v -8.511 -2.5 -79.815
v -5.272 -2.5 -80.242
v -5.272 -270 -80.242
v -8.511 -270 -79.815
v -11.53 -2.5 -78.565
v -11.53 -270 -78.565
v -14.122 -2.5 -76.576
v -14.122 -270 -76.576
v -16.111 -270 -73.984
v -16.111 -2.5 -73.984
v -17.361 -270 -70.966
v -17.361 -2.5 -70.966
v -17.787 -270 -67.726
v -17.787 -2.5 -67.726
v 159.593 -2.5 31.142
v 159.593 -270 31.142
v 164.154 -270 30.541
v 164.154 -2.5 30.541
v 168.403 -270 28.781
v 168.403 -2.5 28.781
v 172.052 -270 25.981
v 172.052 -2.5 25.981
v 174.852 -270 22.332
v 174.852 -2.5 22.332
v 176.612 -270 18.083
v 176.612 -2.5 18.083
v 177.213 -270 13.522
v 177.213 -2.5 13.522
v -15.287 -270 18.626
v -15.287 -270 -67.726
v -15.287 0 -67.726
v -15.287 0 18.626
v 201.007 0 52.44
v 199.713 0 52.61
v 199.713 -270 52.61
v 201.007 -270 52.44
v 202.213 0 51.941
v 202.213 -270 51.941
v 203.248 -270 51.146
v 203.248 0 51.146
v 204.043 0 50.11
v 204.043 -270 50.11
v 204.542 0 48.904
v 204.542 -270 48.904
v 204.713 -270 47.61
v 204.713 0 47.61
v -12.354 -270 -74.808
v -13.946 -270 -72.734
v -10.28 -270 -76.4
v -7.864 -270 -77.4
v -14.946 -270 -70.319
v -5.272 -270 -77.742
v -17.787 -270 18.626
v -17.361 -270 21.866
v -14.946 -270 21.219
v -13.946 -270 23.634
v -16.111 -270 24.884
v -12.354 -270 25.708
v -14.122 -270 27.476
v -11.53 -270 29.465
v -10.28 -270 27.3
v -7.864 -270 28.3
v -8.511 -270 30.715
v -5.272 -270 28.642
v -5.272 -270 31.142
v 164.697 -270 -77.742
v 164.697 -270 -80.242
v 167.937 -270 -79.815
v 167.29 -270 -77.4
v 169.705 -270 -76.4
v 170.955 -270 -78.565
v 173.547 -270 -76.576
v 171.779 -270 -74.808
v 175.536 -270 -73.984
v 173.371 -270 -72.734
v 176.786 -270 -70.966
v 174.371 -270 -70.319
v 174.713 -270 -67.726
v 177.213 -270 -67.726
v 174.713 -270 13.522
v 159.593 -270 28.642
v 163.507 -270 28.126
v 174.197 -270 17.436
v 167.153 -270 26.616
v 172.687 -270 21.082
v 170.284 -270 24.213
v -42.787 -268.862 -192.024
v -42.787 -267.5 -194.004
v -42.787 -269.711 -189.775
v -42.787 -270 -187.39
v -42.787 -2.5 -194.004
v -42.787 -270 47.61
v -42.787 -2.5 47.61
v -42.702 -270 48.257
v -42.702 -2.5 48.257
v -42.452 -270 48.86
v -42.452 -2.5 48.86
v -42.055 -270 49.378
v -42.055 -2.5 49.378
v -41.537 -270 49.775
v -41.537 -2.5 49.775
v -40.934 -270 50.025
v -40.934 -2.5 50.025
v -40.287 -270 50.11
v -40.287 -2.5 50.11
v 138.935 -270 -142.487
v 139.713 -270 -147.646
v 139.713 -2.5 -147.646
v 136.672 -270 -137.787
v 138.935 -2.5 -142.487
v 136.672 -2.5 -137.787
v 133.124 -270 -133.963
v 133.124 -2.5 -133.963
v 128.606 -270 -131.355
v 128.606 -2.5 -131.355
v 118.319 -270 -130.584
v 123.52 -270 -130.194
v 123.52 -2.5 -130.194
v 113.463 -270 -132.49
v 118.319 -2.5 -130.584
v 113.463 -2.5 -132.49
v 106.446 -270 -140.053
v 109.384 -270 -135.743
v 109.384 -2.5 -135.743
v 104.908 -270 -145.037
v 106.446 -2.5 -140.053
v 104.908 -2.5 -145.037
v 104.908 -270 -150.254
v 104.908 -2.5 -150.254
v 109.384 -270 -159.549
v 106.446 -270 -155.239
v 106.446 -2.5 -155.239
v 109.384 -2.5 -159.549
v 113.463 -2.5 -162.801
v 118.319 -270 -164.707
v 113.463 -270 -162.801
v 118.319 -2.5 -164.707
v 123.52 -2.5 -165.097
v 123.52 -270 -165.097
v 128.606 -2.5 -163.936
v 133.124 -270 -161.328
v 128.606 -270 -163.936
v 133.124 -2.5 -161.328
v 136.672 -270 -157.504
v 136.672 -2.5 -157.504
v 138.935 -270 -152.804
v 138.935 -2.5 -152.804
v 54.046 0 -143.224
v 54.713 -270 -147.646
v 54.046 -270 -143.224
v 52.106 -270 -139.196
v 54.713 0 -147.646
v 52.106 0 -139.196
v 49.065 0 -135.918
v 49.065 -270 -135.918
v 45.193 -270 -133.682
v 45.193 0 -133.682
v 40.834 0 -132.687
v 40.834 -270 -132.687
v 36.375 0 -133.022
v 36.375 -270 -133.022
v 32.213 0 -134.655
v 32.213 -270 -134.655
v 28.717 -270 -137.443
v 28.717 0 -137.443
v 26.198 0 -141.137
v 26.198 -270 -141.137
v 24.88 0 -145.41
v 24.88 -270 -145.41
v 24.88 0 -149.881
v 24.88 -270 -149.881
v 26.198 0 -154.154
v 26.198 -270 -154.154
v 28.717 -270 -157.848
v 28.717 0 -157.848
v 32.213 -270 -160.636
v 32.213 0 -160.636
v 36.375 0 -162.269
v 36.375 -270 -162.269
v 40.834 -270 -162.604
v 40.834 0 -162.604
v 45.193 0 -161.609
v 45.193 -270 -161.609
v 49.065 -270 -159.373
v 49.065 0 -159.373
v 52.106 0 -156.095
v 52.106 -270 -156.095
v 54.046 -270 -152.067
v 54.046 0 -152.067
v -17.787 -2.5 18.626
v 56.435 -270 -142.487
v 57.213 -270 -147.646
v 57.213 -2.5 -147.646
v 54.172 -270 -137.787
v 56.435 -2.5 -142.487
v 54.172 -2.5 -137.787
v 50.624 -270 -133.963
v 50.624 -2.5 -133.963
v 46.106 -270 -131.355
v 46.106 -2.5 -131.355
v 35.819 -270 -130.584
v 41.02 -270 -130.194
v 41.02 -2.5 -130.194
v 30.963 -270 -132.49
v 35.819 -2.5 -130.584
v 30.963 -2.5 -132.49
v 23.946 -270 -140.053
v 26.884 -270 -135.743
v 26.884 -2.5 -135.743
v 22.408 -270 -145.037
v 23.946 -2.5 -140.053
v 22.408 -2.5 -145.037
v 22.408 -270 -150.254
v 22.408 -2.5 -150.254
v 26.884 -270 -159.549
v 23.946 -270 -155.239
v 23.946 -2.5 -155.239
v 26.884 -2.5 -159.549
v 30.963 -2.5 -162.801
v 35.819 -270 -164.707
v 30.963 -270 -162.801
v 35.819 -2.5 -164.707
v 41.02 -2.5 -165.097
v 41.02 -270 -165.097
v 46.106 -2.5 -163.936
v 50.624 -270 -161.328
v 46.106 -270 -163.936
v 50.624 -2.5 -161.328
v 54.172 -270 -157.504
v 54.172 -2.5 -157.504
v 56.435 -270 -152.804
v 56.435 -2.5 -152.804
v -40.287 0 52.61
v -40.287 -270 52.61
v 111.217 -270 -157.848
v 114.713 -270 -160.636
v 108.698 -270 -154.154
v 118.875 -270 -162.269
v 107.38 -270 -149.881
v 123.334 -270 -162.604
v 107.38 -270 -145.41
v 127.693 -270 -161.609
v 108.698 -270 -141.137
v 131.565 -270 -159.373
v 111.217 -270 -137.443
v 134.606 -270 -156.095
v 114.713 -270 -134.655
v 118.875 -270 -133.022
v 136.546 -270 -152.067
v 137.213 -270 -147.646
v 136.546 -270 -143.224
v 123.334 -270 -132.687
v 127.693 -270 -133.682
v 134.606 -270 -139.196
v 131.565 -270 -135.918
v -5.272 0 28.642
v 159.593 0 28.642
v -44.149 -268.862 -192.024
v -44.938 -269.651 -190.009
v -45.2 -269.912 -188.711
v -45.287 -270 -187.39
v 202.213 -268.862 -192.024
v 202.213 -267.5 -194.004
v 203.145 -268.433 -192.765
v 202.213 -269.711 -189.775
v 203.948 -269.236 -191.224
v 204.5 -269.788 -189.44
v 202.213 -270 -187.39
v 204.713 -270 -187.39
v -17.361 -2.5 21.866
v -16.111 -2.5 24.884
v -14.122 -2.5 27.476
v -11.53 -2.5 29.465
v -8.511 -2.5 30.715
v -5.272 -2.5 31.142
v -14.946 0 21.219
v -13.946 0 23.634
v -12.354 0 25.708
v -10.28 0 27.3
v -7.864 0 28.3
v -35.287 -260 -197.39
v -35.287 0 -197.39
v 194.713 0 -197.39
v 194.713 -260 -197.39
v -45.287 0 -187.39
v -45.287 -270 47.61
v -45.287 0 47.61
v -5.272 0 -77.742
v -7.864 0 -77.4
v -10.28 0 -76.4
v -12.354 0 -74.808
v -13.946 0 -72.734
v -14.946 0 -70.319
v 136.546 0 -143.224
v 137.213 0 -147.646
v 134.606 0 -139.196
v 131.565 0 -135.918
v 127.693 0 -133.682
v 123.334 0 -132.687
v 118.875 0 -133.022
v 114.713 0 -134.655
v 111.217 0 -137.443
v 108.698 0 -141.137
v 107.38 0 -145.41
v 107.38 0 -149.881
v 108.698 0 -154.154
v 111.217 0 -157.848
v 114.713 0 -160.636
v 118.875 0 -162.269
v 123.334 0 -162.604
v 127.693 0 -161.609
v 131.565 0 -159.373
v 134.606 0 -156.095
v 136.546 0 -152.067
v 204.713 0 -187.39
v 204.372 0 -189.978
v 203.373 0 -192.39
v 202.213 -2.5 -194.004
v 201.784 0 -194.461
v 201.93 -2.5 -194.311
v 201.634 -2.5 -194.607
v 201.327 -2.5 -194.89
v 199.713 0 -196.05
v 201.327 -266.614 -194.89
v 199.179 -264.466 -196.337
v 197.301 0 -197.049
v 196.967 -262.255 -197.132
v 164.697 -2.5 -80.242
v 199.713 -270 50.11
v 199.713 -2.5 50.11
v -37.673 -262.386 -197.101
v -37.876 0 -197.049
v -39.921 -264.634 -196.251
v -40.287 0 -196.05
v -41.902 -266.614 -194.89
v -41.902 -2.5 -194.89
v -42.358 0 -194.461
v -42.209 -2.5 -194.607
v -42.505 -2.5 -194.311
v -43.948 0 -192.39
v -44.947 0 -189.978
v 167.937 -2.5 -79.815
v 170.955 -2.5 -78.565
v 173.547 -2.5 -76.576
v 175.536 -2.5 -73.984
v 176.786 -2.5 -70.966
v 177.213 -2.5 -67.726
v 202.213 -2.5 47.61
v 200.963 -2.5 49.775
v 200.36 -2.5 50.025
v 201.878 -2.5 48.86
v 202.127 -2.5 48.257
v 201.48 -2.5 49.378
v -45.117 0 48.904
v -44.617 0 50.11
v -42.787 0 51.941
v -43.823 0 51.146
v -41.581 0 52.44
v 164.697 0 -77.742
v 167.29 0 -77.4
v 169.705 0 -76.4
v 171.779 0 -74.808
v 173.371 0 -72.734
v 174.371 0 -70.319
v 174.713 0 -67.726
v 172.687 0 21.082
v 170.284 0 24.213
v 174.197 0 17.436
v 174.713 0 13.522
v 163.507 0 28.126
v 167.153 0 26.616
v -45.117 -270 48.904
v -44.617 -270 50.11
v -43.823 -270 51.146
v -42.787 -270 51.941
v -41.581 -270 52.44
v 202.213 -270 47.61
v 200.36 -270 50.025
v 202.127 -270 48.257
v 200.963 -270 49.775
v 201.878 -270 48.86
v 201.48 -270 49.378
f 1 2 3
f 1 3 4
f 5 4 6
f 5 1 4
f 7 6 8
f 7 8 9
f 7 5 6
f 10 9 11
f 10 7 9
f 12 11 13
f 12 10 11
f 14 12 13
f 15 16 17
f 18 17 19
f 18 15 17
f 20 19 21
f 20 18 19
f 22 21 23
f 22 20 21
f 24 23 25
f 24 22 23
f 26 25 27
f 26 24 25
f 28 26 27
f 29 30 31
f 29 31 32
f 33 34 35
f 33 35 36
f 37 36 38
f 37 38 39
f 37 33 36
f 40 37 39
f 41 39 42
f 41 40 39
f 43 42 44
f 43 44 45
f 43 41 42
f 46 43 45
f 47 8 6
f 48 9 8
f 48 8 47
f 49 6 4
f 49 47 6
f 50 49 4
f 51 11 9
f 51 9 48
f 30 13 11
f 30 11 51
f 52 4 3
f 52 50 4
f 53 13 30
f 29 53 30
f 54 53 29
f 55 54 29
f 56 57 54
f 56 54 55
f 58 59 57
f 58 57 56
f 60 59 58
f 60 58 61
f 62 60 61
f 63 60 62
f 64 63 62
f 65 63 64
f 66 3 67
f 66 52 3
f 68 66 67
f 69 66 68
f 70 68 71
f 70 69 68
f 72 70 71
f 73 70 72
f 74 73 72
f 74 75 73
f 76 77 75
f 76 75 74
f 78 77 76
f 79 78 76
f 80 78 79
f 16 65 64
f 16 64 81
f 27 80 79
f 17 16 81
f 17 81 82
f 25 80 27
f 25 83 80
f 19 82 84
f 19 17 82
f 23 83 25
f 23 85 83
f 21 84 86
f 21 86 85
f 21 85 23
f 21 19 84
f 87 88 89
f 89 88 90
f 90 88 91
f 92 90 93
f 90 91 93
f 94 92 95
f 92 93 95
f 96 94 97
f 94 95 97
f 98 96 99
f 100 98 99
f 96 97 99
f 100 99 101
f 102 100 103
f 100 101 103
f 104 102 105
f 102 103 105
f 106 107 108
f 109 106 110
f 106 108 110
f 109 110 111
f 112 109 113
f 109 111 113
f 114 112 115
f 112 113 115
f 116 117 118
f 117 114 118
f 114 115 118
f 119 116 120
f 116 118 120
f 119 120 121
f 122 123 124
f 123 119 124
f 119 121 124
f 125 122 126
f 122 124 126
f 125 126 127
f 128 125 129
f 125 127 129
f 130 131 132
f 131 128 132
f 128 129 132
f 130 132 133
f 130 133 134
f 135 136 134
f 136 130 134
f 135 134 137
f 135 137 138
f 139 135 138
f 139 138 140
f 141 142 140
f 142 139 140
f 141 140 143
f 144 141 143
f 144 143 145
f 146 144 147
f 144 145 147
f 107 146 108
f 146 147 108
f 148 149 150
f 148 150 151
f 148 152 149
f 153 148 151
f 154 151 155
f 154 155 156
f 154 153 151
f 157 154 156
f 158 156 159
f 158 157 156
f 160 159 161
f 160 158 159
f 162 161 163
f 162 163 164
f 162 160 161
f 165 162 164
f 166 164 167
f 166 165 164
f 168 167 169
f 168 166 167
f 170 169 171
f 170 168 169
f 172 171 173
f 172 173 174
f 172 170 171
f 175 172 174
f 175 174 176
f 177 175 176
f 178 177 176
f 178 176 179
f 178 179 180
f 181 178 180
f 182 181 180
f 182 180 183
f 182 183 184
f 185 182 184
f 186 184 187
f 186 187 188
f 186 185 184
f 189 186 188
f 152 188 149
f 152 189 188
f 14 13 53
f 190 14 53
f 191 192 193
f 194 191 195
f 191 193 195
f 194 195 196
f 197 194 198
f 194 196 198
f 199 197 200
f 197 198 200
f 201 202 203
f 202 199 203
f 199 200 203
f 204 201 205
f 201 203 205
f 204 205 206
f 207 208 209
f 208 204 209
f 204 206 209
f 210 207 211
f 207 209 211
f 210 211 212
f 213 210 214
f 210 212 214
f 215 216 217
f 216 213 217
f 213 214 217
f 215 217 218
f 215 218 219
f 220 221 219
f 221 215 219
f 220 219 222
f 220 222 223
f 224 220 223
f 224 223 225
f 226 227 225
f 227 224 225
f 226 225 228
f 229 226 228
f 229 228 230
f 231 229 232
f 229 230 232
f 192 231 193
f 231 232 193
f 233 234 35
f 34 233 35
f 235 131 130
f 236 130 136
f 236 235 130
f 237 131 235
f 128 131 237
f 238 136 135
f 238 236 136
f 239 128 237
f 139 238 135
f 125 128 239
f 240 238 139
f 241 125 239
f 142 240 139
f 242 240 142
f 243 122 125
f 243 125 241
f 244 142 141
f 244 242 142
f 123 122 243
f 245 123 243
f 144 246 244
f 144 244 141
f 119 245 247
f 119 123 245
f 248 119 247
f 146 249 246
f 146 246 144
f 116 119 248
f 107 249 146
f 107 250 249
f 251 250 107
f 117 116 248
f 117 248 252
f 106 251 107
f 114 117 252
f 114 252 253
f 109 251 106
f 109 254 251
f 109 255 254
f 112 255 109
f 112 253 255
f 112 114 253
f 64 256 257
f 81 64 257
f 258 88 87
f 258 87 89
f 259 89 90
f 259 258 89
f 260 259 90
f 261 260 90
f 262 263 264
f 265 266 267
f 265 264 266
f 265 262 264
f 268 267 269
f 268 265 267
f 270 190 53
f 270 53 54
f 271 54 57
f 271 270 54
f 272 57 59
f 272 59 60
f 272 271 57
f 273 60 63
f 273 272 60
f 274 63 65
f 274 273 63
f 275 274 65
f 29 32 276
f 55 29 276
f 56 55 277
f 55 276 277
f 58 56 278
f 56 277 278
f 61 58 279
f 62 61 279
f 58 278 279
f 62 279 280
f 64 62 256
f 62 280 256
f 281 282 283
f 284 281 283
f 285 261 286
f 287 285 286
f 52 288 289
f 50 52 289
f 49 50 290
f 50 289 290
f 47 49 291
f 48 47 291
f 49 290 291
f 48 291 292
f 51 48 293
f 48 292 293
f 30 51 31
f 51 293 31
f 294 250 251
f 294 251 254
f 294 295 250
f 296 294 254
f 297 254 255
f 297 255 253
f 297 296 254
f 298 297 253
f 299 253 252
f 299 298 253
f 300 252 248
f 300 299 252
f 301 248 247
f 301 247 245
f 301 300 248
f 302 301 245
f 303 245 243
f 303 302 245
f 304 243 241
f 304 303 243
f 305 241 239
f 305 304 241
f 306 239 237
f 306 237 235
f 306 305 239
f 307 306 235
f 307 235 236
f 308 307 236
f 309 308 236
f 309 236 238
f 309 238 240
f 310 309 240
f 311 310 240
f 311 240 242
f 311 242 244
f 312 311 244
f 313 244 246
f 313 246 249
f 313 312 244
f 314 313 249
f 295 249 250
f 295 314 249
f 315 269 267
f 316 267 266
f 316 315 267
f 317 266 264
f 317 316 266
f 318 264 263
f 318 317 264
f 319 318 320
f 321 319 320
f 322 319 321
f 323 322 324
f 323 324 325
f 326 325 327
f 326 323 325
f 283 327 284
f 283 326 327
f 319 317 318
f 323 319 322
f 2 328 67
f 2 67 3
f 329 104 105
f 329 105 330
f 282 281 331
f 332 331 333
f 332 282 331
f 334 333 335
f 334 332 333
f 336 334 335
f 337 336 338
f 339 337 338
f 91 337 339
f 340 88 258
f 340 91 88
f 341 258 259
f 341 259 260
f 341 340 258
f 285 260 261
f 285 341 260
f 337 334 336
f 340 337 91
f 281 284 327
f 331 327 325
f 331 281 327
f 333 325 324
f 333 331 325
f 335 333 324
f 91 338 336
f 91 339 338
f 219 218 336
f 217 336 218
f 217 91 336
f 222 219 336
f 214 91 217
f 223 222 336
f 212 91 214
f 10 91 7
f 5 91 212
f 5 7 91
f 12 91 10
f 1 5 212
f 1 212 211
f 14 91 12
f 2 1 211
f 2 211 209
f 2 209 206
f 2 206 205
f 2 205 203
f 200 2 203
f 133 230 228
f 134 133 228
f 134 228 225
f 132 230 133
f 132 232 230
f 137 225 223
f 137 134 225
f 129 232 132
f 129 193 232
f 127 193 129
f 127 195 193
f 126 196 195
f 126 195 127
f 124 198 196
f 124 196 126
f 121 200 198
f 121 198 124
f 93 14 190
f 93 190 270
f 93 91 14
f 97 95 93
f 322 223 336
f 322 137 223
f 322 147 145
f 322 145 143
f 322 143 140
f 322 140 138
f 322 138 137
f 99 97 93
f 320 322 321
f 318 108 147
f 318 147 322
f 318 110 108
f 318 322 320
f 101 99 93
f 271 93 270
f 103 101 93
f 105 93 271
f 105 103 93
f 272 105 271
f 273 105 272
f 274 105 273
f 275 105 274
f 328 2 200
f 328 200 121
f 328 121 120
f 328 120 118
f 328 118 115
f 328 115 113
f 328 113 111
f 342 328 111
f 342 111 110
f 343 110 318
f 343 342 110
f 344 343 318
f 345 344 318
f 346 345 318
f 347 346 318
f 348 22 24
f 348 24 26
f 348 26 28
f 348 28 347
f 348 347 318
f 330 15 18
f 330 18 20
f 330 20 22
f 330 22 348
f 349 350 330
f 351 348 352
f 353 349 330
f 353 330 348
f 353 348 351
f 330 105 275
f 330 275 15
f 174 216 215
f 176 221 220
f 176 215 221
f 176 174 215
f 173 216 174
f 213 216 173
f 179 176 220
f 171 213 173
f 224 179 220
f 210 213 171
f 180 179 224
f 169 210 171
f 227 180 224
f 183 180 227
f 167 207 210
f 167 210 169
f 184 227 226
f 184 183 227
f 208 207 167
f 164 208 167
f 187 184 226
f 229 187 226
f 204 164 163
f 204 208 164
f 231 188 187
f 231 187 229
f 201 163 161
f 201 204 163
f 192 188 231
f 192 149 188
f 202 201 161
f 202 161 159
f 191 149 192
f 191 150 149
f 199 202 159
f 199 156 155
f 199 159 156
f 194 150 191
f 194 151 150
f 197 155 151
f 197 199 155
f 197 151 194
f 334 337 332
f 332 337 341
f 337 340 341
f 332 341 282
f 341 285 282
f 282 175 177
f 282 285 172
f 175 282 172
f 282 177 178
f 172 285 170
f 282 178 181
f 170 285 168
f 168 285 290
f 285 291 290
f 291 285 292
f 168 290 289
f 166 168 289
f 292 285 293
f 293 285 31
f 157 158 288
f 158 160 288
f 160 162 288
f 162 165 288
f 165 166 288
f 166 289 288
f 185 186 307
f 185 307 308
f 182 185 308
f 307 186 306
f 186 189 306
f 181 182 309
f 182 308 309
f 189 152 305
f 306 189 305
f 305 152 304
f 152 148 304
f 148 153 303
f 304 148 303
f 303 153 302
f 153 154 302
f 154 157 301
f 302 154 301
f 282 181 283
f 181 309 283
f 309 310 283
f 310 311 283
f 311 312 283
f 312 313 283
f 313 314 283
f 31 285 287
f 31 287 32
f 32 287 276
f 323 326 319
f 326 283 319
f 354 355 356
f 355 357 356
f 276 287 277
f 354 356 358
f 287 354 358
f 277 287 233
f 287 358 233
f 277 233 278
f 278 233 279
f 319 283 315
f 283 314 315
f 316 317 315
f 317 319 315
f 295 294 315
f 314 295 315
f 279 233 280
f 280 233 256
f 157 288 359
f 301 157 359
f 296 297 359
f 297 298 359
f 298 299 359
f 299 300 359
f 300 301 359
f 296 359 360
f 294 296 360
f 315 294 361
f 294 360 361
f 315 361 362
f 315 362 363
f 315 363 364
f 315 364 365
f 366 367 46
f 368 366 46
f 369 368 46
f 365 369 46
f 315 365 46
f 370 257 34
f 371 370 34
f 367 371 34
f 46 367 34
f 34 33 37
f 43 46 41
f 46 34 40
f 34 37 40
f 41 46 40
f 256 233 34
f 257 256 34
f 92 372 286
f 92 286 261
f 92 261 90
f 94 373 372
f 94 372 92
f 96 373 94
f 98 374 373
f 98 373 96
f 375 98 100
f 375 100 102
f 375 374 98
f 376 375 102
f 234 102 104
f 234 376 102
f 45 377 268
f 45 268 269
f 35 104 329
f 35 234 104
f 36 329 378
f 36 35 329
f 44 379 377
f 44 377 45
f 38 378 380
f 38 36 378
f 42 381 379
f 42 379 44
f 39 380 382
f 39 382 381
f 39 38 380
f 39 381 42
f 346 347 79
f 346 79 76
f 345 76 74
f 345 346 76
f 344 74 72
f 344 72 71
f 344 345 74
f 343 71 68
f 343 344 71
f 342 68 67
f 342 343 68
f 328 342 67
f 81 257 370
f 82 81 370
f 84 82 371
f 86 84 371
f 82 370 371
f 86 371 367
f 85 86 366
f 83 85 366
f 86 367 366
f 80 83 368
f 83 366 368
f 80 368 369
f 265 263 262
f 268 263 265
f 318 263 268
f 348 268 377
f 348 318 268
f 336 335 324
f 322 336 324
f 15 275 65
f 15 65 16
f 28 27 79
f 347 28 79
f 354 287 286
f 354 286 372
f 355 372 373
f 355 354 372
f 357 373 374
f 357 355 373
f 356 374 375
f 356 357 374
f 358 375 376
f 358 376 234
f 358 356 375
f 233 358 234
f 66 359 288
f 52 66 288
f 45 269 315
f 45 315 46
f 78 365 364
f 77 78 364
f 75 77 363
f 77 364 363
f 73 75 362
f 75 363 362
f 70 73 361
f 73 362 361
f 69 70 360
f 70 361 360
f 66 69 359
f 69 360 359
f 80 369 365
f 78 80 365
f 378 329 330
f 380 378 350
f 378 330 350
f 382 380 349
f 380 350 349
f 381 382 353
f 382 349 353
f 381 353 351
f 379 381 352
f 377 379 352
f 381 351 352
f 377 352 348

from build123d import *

# Parameters (mm, degrees)
F0_W        = 250
F0_H        = 250
F0_R        = 15
F1_DEPTH    = 20
F2_R        = 5
F3_DEPTH    = 250
F5_T        = -2.5
F6_T1_DEPTH = 45
F6_T3_DEPTH = 275
F6_T5_DEPTH = 300


# Not quite as in the source:
# - a fillet or chamfer that OpenCascade refuses, or shapes differently, is made with other operations: its cross-section is extruded or revolved along the edge and cut away or added
# - the program builds the solid bodies; features that only make, move or delete a surface that nothing else refers to are left out


with BuildPart() as f1:
    # F0 (on Front) → F1 (new body)
    with BuildSketch(Plane.XZ):
        with Locations((79.7126553953, -72.3895989358)):
            Rectangle(F0_W, F0_H)
        with Locations((39.7126553953, -147.645547986)):
            Circle(F0_R, mode=Mode.SUBTRACT)
        with Locations((122.2126553953, -147.645547986)):
            Circle(F0_R, mode=Mode.SUBTRACT)
        with BuildLine():
            Line((-15.2873446047, -67.7264088296), (-15.2873446047, 18.6264493965))
            ThreePointArc((-15.2873446047, 18.6264493965), (-12.3539628579, 25.7082593932), (-5.2721528612, 28.64164114))
            Line((-5.2721528612, 28.64164114), (159.5934226625, 28.64164114))
            ThreePointArc((159.5934226625, 28.64164114), (170.2843346542, 24.2133203989), (174.7126553953, 13.5224084073))
            Line((174.7126553953, 13.5224084073), (174.7126553953, -67.7264088296))
            ThreePointArc((174.7126553953, -67.7264088296), (171.7792736485, -74.8082188263), (164.6974636518, -77.7416005731))
            Line((164.6974636518, -77.7416005731), (-5.2721528612, -77.7416005731))
            ThreePointArc((-5.2721528612, -77.7416005731), (-12.3539628579, -74.8082188263), (-15.2873446047, -67.7264088296))
        make_face(mode=Mode.SUBTRACT)
    extrude(amount=F1_DEPTH)

    # F2
    f2_edges = [f1.edges().sort_by_distance(p)[0] for p in [
        (204.712655, -10, 52.610401),
        (-45.287345, -10, 52.610401),
    ]]
    fillet(f2_edges, radius=F2_R)

    # F3 (add): a face of the model
    f3_faces = [f1.faces().sort_by_distance(p)[0] for p in [
        (79.7304888538, -20, -93.2584337022),
    ]]
    extrude(f3_faces, amount=F3_DEPTH)

    # F5
    f5_openings = [f1.faces().sort_by_distance(p)[0] for p in [
        (79.730489, -270, -93.258434),
    ]]
    offset(amount=F5_T, openings=f5_openings, kind=Kind.INTERSECTION)

    # F6: fillet of radius 10 on 5 edges, made by hand

    # F6_s2 → F6_t1 (cut)
    with BuildSketch(Plane.XZ.offset(-25)):
        with BuildLine():
            ThreePointArc((204.7126553953, -187.3895989358), (201.7837232071, -194.4606667477), (194.7126553953, -197.3895989358))
            Line((194.7126553953, -197.3895989358), (204.7126553953, -197.3895989358))
            Line((204.7126553953, -197.3895989358), (204.7126553953, -187.3895989358))
        make_face()
        with BuildLine():
            ThreePointArc((-35.2873446047, -197.3895989358), (-42.3584124166, -194.4606667477), (-45.2873446047, -187.3895989358))
            Line((-45.2873446047, -187.3895989358), (-45.2873446047, -197.3895989358))
            Line((-45.2873446047, -197.3895989358), (-35.2873446047, -197.3895989358))
        make_face()
    extrude(amount=F6_T1_DEPTH, mode=Mode.SUBTRACT)

    # F6_s4 → F6_t3 (cut)
    with BuildSketch(Plane.XZ.offset(20)):
        with BuildLine():
            ThreePointArc((204.7126553953, -187.3895989358), (201.7837232071, -194.4606667477), (194.7126553953, -197.3895989358))
            Line((194.7126553953, -197.3895989358), (204.7126553953, -197.3895989358))
            Line((204.7126553953, -197.3895989358), (204.7126553953, -187.3895989358))
        make_face()
        with BuildLine():
            ThreePointArc((-35.2873446047, -197.3895989358), (-42.3584124166, -194.4606667477), (-45.2873446047, -187.3895989358))
            Line((-45.2873446047, -187.3895989358), (-45.2873446047, -197.3895989358))
            Line((-45.2873446047, -197.3895989358), (-35.2873446047, -197.3895989358))
        make_face()
    extrude(amount=F6_T3_DEPTH, mode=Mode.SUBTRACT)

    # F6_s6 → F6_t5 (cut)
    with BuildSketch(Plane.YZ.offset(-70.2873446047)):
        with BuildLine():
            ThreePointArc((-260, -197.3895989358), (-267.0710678119, -194.4606667477), (-270, -187.3895989358))
            Line((-270, -187.3895989358), (-270, -197.3895989358))
            Line((-270, -197.3895989358), (-260, -197.3895989358))
        make_face()
    extrude(amount=F6_T5_DEPTH, mode=Mode.SUBTRACT)


solid = f1.part
